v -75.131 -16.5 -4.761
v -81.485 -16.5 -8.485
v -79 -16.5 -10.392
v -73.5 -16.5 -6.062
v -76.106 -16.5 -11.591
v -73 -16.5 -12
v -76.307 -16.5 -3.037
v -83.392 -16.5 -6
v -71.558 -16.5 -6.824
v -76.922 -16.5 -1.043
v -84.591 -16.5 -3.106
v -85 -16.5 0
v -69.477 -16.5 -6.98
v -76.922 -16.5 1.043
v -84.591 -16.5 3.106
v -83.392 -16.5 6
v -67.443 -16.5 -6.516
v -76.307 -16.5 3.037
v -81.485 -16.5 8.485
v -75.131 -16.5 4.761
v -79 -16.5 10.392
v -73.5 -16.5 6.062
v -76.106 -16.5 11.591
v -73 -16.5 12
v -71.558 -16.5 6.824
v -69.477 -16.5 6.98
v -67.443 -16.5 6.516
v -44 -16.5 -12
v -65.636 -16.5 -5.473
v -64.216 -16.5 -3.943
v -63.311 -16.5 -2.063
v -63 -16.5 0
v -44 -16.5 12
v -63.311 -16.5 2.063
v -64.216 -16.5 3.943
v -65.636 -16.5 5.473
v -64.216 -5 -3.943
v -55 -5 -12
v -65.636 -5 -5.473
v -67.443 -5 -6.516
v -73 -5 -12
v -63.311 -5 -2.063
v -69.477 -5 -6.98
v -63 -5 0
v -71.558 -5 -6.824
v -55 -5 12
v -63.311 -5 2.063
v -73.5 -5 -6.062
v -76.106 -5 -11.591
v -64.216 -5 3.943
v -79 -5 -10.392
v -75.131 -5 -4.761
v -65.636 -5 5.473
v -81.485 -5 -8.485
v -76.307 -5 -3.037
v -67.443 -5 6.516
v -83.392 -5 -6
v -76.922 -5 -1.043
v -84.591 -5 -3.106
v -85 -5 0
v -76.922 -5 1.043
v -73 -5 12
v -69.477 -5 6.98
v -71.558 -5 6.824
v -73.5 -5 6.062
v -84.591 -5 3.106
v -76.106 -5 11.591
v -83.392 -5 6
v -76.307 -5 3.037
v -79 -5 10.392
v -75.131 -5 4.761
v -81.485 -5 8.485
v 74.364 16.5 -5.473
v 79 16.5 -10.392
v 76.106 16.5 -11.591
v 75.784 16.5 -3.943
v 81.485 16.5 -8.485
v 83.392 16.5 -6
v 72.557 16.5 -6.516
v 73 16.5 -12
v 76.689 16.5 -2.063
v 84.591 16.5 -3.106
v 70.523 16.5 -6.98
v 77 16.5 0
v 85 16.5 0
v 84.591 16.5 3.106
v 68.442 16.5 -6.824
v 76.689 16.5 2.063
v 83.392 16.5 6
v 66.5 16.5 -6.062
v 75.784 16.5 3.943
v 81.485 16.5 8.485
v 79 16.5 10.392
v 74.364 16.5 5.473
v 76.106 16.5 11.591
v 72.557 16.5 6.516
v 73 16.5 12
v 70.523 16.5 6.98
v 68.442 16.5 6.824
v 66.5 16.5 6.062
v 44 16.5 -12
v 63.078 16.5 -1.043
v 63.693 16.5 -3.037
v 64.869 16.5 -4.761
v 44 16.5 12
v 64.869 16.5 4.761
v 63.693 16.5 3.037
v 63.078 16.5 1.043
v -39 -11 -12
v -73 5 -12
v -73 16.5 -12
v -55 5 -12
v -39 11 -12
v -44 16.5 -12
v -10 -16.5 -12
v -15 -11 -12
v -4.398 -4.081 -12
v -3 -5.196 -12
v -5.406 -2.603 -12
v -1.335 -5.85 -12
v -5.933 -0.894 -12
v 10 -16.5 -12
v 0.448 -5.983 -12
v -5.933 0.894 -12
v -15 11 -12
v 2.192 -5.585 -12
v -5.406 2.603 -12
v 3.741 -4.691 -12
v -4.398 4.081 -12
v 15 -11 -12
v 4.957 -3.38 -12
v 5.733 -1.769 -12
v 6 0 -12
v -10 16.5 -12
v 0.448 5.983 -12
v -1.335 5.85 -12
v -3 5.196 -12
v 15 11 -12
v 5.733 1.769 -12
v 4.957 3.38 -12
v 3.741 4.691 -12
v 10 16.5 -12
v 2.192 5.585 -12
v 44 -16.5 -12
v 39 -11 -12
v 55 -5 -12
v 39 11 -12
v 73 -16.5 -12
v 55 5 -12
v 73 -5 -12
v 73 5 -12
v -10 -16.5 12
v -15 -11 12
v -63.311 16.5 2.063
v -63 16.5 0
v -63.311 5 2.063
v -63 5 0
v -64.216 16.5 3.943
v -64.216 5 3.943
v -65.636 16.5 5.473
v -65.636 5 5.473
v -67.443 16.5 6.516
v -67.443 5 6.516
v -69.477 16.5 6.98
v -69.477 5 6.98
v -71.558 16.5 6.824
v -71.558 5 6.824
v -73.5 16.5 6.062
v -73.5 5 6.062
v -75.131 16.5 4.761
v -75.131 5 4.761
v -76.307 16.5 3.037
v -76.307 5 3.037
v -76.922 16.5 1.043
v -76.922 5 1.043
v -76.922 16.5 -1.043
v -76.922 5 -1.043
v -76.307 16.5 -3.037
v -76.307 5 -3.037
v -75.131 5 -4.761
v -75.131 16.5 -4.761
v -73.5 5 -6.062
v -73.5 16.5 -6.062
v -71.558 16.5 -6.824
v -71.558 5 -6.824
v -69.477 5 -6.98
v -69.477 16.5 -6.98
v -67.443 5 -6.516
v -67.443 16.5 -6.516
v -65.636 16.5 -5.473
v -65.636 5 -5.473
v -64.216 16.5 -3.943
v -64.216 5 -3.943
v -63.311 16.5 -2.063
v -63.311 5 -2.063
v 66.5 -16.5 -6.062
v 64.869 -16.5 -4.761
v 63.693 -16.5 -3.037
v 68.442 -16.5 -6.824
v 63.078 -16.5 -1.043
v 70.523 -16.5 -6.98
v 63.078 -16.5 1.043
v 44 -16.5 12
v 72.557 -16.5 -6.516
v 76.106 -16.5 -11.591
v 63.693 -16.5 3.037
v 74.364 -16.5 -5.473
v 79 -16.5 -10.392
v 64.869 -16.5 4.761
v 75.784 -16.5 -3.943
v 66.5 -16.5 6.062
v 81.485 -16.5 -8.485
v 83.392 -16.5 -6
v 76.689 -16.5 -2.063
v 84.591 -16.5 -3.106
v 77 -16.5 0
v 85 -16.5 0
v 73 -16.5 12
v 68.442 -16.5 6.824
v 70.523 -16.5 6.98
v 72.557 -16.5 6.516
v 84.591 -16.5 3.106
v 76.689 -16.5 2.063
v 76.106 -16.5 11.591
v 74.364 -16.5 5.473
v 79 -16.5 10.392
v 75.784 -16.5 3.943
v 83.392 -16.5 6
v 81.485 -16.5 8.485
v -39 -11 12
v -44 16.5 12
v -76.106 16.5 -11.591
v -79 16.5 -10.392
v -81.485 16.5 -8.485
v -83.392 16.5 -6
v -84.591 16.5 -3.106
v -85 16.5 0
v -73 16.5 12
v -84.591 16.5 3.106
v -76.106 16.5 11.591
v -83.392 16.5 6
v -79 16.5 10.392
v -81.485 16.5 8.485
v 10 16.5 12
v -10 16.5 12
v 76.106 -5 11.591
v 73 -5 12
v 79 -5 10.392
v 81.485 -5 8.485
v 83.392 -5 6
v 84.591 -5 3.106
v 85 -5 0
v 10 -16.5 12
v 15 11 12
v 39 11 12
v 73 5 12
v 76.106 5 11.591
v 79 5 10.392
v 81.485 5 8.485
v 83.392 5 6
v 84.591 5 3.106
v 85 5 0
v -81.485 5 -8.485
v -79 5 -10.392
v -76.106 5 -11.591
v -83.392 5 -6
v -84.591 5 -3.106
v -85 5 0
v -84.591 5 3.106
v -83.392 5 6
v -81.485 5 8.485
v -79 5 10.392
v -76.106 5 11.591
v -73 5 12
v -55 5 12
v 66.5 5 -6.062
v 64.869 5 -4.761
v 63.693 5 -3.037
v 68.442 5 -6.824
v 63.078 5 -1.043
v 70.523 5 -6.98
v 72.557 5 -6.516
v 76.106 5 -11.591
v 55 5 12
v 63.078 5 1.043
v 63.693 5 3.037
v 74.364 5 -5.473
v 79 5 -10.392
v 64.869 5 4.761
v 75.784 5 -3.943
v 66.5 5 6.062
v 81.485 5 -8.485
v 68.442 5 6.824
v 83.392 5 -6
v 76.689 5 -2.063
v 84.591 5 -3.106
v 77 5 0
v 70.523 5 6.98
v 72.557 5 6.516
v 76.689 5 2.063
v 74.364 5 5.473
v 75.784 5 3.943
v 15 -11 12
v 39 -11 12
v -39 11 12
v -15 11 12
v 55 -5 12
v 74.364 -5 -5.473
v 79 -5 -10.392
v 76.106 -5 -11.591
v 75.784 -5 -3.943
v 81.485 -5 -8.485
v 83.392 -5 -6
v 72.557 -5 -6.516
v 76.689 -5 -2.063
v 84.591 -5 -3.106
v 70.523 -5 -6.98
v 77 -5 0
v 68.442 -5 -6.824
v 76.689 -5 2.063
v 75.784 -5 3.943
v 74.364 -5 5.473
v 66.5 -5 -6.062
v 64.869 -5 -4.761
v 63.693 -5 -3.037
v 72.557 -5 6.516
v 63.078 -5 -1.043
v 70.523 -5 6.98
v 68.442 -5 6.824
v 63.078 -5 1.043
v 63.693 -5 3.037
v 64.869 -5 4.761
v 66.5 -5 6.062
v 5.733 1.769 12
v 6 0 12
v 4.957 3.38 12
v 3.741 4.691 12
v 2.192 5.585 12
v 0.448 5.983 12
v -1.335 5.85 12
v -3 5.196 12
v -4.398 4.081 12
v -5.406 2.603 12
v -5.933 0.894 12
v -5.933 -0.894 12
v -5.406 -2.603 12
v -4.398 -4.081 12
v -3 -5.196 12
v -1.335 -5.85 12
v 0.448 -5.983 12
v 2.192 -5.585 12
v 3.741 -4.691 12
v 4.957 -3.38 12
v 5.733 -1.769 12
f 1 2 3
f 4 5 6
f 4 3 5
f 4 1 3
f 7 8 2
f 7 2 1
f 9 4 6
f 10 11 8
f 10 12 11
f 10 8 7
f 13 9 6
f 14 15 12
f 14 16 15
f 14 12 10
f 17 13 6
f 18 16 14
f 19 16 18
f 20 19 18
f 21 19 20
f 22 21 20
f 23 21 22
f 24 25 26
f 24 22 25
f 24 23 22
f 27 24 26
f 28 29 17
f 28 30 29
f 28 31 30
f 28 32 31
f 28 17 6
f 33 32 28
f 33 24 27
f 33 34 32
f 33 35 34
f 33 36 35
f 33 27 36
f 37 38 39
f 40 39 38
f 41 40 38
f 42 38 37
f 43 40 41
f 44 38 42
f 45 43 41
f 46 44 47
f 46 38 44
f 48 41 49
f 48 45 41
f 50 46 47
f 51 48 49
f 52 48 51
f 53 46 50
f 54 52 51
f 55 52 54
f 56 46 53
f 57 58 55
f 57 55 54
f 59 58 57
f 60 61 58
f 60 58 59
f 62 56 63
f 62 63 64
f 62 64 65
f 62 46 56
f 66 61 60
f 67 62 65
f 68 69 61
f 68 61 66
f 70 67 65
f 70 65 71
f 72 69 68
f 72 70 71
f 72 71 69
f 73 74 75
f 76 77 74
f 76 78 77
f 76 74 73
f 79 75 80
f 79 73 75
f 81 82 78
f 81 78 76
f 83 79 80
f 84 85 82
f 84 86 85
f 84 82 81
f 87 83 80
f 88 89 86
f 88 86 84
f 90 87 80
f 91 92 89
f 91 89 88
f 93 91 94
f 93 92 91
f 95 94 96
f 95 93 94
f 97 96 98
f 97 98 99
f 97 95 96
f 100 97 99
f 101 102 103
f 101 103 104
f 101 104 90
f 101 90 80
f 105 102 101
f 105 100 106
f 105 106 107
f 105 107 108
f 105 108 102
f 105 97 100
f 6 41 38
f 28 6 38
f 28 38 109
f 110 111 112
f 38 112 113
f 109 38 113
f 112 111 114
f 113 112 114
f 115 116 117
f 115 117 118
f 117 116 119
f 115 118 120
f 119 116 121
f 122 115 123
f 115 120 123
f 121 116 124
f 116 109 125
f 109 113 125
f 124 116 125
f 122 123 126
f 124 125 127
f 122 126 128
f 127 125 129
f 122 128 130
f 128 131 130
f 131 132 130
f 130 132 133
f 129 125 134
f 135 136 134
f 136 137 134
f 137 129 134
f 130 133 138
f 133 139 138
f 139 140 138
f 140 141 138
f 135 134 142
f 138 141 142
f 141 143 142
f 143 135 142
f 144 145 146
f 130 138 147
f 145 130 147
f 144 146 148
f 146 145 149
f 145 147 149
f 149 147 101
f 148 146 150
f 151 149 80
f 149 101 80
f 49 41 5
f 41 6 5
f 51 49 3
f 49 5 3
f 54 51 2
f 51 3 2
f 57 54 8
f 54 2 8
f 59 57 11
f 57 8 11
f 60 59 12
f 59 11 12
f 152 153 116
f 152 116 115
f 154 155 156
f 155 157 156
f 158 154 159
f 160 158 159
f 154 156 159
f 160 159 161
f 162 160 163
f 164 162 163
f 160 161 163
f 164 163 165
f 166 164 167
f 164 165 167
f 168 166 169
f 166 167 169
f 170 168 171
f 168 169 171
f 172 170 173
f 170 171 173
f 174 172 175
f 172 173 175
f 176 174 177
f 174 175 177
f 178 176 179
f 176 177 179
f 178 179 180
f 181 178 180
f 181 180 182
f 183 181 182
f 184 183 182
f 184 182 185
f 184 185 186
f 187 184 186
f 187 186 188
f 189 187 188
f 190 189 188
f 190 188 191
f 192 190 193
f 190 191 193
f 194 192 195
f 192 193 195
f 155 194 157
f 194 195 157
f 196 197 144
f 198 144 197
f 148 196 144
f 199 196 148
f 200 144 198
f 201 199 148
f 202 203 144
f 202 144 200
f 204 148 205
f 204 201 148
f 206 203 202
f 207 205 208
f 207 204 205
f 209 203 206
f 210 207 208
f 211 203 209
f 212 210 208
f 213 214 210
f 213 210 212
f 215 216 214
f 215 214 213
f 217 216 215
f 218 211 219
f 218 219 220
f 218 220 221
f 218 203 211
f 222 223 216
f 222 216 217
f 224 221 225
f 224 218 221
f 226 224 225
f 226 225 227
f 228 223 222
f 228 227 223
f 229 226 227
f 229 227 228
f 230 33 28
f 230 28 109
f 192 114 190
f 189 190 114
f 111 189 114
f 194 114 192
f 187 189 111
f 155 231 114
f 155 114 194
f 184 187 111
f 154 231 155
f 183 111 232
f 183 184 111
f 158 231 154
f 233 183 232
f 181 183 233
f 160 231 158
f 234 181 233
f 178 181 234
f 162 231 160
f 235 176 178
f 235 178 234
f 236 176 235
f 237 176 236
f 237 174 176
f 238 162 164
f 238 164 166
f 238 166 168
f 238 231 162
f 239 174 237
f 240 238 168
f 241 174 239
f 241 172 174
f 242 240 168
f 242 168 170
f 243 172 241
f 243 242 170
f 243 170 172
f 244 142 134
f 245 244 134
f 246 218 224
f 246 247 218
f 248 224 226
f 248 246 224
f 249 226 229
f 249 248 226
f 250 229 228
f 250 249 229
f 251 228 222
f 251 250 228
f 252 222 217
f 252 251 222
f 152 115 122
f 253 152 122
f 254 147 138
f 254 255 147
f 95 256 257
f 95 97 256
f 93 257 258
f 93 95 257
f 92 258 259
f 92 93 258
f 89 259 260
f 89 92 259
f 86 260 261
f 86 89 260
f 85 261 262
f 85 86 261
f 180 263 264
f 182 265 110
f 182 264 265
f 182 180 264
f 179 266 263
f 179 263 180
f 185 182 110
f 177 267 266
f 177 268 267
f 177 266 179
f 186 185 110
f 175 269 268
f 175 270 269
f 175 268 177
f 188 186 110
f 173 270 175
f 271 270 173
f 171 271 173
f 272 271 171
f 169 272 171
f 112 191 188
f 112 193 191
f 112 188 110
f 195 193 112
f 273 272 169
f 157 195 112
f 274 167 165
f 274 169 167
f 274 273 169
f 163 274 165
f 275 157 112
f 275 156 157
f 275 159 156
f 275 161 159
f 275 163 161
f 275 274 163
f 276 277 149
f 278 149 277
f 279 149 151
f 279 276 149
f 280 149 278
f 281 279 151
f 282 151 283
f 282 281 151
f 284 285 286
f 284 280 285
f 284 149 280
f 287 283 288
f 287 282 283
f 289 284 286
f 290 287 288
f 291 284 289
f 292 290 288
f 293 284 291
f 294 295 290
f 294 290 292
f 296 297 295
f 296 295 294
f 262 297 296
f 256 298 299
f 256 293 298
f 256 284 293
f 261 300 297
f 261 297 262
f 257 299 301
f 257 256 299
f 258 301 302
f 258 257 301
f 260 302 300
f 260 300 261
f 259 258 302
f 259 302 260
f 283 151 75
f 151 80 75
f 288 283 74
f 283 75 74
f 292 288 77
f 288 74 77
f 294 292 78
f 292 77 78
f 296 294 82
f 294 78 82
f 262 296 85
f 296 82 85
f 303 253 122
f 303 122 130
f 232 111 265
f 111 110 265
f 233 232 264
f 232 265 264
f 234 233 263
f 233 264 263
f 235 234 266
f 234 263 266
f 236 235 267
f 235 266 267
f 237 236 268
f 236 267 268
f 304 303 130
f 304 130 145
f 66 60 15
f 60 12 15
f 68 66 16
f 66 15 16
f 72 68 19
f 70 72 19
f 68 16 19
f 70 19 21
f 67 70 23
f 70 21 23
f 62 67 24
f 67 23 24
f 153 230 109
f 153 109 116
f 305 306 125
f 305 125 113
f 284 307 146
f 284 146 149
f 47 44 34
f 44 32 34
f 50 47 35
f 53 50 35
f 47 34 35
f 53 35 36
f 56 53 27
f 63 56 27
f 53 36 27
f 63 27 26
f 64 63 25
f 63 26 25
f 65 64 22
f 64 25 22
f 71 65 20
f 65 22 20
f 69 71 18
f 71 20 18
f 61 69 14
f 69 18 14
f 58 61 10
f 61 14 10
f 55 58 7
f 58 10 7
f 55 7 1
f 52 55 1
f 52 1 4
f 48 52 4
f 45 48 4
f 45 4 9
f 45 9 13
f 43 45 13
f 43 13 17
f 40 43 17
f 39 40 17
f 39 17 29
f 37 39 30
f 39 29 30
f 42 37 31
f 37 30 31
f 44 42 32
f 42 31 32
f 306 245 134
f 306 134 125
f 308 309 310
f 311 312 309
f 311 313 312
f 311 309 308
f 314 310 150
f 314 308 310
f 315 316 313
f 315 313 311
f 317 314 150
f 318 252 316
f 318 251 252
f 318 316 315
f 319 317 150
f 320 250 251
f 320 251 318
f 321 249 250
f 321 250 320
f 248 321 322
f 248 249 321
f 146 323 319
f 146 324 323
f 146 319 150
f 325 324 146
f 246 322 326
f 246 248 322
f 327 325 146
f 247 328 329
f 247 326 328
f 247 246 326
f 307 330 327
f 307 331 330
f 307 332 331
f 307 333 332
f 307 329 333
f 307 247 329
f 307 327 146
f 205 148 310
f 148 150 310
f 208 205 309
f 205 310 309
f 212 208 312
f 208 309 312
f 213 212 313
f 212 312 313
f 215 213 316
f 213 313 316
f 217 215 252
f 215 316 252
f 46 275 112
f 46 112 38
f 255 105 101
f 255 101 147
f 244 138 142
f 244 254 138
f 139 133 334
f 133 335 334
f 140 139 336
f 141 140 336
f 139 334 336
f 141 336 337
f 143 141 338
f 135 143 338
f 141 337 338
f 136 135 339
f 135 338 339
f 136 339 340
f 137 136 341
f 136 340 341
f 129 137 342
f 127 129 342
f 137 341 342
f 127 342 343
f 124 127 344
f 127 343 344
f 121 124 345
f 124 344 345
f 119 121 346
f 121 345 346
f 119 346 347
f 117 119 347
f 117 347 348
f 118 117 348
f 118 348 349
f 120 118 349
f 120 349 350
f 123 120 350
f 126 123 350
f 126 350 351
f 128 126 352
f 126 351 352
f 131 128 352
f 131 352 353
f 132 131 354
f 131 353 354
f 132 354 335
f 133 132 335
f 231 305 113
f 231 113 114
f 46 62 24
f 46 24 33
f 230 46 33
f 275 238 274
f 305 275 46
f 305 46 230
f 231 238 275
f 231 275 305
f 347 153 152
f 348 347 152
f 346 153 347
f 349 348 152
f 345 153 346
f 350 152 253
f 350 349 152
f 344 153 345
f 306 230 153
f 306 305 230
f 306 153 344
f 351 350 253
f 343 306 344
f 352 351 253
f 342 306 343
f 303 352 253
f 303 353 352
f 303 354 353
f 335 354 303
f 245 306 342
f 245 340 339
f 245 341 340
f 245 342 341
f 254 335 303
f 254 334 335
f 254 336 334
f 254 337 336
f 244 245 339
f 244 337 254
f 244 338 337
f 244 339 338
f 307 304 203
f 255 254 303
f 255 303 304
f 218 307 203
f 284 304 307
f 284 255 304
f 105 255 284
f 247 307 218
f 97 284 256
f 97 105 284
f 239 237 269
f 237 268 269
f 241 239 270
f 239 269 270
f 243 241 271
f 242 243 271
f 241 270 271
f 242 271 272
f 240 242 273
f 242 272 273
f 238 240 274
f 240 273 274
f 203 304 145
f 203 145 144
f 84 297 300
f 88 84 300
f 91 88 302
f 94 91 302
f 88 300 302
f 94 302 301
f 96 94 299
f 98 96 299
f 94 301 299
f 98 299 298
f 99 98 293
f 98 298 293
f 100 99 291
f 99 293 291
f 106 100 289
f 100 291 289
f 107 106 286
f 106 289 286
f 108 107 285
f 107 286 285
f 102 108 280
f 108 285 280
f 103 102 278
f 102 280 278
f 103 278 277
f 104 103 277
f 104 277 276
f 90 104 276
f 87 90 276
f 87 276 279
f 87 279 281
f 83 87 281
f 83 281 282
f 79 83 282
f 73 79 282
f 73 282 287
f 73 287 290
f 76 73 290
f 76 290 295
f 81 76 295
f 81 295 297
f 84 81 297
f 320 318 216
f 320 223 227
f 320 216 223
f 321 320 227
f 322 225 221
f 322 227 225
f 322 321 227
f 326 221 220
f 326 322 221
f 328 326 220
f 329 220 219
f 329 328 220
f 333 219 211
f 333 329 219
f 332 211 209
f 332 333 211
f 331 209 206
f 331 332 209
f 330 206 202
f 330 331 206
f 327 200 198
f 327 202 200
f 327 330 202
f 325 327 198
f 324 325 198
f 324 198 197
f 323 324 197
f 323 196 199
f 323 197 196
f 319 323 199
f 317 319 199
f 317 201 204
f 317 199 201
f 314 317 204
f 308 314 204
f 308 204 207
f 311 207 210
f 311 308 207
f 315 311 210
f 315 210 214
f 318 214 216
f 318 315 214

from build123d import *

# Parameters (mm, degrees)
F1_DEPTH = 12
F2_R     = 6
F3_DEPTH = 25
F4_R     = 7
F5_DEPTH = 50
F6_R     = 11.99999
F7_R     = 11.99999


# Not quite as in the source:
# - a fillet or chamfer is up to 0.001 mm smaller than in the source, because OpenCascade refuses the exact size


with BuildPart() as f1:
    # F0 (on Top) → F1 (new body, symmetric)
    with BuildSketch(Plane.XY):
        Polygon((10, 16.5), (0, 16.5), (-10, 16.5), (-15, 11), (-39, 11), (-44, 16.5), (-85, 16.5), (-85, 5), (-55, 5), (-55, 0), (-55, -5), (-85, -5), (-85, -16.5), (-44, -16.5), (-39, -11), (-15, -11), (-10, -16.5), (0, -16.5), (10, -16.5), (15, -11), (39, -11), (44, -16.5), (85, -16.5), (85, -5), (55, -5), (55, 0), (55, 5), (85, 5), (85, 16.5), (44, 16.5), (39, 11), (15, 11), align=None)
    extrude(amount=F1_DEPTH, both=True)

    # F2 (on Top) → F3 (cut, symmetric)
    with BuildSketch(Plane.XY):
        Circle(F2_R)
    extrude(amount=F3_DEPTH, both=True, mode=Mode.SUBTRACT)

    # F4 (on Front) → F5 (cut, symmetric)
    with BuildSketch(Plane.XZ):
        with Locations((70, 0)):
            Circle(F4_R)
        with Locations((-70, 0)):
            Circle(F4_R)
    extrude(amount=F5_DEPTH, both=True, mode=Mode.SUBTRACT)

    # F6 (radius 12 in the source; OpenCascade refuses exactly that, so slightly less here)
    f6_edges = [f1.edges().sort_by_distance(p)[0] for p in [
        (85, 10.75, 12),
        (85, -10.75, 12),
        (85, -10.75, -12),
        (85, 10.75, -12),
    ]]
    fillet(f6_edges, radius=F6_R)

    # F7 (radius 12 in the source; OpenCascade refuses exactly that, so slightly less here)
    f7_edges = [f1.edges().sort_by_distance(p)[0] for p in [
        (-85, -10.75, 12),
        (-85, 10.75, 12),
        (-85, 10.75, -12),
        (-85, -10.75, -12),
    ]]
    fillet(f7_edges, radius=F7_R)


solid = f1.part
